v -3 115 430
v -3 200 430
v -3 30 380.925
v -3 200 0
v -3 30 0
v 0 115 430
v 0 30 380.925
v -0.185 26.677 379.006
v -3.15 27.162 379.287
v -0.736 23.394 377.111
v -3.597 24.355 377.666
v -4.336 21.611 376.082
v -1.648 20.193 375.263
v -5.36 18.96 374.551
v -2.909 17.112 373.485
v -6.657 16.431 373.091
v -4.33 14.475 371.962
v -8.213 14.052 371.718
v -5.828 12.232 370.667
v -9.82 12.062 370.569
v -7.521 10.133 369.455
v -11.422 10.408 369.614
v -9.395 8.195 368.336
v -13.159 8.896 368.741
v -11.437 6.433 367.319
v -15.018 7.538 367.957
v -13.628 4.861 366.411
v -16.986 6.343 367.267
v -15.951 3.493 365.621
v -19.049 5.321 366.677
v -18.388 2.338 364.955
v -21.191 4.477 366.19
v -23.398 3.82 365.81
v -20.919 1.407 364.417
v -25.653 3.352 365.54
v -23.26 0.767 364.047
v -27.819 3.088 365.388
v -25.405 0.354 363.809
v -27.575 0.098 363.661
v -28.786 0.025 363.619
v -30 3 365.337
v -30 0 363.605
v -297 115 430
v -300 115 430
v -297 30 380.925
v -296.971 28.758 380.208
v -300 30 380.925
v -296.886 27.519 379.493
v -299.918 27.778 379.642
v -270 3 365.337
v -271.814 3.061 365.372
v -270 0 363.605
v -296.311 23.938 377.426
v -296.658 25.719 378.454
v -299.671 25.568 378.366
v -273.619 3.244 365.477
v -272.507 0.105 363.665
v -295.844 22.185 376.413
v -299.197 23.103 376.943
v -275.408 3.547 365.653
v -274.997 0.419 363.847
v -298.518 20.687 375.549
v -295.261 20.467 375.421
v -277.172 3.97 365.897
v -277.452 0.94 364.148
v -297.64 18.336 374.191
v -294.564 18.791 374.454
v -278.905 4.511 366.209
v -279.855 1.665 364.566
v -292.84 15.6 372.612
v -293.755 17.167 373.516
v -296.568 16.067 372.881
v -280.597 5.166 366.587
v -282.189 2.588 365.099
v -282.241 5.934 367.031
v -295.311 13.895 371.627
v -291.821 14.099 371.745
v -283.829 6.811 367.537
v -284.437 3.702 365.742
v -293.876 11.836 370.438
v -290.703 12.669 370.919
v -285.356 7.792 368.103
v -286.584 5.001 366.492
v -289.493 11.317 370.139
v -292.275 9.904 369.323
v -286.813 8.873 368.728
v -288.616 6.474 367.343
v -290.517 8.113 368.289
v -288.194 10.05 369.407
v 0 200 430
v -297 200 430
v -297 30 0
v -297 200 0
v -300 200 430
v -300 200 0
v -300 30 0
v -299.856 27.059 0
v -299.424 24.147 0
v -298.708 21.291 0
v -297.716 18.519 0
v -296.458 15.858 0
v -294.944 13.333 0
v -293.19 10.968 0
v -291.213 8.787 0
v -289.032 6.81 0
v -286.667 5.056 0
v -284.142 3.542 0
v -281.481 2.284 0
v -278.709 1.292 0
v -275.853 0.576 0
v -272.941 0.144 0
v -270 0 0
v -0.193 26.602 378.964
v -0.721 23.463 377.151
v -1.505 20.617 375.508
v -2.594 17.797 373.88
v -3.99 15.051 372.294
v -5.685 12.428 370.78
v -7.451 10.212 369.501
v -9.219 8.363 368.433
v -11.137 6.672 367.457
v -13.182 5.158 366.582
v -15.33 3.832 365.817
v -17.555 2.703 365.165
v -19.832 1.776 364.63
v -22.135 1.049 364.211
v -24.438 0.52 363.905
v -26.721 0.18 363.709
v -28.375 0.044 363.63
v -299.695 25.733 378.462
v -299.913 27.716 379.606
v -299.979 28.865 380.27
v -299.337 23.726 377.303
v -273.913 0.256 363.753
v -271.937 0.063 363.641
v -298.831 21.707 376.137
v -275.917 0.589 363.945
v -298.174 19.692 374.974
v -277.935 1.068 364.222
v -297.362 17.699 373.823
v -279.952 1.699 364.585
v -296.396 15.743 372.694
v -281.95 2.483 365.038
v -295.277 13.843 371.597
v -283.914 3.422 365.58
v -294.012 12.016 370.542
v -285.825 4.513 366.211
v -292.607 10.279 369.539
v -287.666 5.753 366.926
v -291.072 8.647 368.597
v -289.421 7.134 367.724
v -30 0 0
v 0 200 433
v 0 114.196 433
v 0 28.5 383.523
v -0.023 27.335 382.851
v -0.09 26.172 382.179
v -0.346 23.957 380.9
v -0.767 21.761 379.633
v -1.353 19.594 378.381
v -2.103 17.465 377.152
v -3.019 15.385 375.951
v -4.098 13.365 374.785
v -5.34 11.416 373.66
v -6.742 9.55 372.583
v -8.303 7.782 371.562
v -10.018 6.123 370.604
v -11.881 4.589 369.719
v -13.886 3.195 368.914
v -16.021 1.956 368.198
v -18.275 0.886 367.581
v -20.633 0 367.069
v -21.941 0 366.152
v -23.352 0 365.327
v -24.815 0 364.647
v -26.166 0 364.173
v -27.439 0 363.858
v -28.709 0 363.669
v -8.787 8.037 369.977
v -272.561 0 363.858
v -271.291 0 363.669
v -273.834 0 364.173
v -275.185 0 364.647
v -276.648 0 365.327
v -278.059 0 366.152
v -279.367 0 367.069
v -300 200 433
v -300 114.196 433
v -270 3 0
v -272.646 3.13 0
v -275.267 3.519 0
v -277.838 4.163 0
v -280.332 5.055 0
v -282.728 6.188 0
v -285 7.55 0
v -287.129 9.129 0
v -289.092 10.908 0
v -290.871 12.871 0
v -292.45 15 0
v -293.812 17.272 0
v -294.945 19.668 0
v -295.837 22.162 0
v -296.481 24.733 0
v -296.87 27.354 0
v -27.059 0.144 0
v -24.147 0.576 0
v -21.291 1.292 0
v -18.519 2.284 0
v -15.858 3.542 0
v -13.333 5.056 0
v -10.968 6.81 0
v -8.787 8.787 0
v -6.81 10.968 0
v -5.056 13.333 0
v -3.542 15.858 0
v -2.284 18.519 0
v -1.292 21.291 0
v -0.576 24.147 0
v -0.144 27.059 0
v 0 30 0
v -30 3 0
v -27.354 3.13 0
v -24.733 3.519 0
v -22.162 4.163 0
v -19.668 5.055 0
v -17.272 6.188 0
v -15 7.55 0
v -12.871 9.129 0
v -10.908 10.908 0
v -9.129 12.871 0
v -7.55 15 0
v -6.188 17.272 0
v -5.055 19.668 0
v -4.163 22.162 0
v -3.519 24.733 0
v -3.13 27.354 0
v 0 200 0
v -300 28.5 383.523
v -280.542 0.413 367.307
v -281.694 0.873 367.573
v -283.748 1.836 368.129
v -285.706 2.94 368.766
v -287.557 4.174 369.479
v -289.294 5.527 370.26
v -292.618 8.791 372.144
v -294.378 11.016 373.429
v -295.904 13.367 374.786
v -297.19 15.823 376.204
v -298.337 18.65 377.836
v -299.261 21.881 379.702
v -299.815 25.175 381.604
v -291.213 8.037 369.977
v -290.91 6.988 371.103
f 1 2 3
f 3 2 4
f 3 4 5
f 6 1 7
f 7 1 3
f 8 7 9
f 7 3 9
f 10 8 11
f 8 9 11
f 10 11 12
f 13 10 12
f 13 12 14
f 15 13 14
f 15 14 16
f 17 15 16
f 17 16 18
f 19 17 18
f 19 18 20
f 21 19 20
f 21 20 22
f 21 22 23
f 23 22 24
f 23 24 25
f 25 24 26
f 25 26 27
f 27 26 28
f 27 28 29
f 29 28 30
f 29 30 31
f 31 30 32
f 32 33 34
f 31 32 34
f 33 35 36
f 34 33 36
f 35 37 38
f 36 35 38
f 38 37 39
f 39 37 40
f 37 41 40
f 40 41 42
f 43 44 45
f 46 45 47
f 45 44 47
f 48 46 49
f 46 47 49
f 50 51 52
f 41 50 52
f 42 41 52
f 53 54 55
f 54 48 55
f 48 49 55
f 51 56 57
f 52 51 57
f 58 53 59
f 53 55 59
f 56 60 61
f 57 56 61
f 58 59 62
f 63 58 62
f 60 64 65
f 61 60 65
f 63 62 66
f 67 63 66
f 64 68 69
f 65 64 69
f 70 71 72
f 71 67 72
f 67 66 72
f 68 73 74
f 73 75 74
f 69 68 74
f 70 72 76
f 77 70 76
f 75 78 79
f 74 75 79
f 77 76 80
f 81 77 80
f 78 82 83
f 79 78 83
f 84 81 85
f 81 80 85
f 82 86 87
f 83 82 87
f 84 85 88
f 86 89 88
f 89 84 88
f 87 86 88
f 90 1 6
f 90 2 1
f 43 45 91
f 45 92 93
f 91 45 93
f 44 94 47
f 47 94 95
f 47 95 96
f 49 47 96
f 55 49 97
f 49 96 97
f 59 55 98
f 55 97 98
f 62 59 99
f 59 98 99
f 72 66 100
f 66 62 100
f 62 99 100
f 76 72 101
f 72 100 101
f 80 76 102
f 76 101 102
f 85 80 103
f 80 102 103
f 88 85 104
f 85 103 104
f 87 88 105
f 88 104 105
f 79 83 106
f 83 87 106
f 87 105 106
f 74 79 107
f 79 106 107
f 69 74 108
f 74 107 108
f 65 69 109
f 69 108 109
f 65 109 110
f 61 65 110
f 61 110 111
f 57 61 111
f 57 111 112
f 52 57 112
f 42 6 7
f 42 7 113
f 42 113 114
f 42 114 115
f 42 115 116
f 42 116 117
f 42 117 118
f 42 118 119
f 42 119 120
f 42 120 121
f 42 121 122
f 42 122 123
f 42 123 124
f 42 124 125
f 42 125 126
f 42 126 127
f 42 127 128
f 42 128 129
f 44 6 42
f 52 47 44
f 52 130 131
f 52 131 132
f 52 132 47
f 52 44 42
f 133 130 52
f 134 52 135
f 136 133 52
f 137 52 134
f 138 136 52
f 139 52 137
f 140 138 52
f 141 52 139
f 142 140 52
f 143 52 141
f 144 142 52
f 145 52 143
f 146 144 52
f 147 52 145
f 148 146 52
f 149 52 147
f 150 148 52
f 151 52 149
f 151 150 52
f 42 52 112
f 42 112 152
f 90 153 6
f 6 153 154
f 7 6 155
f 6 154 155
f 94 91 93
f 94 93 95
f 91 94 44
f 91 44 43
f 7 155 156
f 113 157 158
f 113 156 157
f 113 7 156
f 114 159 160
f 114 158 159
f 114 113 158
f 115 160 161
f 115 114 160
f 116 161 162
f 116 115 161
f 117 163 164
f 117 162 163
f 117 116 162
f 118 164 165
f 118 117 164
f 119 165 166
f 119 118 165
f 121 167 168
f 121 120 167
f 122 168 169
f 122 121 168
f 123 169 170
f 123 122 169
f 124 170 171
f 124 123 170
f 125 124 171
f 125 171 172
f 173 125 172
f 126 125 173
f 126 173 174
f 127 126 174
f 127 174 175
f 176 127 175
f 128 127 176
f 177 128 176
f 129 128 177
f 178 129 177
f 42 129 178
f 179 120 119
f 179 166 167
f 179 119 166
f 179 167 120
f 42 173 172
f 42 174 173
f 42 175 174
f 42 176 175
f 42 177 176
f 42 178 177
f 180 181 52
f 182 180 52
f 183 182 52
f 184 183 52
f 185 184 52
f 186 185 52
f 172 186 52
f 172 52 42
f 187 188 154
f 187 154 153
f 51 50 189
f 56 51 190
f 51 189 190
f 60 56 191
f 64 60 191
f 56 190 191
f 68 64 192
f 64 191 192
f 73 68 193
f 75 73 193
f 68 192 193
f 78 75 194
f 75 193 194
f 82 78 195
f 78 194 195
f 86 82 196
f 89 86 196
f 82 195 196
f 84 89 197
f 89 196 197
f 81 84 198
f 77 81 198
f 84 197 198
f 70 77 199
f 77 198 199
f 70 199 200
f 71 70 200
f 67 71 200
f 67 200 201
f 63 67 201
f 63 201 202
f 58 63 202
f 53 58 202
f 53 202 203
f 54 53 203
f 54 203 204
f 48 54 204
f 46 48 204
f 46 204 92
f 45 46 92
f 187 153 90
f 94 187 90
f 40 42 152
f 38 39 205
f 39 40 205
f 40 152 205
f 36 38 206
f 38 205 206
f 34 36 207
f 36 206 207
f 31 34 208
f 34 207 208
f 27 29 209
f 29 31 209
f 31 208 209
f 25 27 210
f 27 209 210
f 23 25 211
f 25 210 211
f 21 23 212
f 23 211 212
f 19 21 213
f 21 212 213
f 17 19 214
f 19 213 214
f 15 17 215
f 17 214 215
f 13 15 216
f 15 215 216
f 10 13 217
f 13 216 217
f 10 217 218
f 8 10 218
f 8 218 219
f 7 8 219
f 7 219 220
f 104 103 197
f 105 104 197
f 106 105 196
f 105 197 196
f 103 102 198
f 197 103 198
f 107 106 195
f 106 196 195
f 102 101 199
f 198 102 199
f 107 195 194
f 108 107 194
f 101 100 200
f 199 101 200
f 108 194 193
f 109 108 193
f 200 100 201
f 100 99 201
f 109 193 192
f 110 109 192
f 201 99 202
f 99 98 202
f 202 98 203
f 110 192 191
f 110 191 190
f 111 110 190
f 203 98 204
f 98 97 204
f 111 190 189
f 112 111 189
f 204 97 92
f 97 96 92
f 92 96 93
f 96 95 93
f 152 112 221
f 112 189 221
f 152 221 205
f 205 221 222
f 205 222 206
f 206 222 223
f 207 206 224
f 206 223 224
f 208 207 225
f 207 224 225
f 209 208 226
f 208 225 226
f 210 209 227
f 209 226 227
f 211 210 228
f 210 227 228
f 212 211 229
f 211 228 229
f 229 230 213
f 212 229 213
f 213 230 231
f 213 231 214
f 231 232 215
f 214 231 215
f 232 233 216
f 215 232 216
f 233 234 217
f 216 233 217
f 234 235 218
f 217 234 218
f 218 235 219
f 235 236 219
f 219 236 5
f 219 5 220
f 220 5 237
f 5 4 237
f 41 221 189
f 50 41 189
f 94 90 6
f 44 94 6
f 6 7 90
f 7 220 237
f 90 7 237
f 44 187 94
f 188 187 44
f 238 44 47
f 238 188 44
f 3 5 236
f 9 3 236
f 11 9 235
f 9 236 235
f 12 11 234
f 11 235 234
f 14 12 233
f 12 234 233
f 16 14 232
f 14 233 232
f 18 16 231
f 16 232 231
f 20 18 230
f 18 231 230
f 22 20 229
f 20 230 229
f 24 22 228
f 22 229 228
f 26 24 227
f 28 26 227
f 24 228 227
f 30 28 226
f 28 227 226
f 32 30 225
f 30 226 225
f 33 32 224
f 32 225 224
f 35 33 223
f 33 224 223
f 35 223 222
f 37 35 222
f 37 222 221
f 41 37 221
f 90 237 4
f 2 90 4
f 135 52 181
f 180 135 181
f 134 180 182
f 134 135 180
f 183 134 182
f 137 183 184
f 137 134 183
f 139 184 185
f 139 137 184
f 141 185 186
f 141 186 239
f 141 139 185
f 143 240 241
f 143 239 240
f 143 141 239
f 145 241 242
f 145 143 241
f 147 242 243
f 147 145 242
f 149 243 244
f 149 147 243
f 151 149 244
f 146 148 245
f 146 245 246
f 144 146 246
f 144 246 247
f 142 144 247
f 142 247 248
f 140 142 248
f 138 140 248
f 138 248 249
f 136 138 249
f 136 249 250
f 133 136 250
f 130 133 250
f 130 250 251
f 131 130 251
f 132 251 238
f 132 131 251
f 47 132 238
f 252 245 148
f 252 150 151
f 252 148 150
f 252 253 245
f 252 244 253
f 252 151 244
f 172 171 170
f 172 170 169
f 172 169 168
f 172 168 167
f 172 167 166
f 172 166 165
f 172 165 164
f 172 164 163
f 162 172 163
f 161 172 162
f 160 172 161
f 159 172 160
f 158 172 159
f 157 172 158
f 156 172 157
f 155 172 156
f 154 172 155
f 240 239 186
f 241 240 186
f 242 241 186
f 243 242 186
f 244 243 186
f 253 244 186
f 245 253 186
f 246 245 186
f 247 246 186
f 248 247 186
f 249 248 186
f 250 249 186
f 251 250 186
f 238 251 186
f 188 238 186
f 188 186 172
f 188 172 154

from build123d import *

# Parameters (mm, degrees)
F1_DEPTH = 430
F3_DEPTH = 455
F5_DEPTH = 300
F7_DEPTH = 16


with BuildPart() as f1:
    # F0 (on Top) → F1 (new body)
    with BuildSketch(Plane.XY):
        with BuildLine():
            Line((-270, 0), (-30, 0))
            ThreePointArc((-30, 0), (-8.7867965644, 8.7867965644), (0, 30))
            Line((0, 30), (0, 200))
            Line((0, 200), (-3, 200))
            Line((-3, 200), (-3, 30))
            ThreePointArc((-3, 30), (-10.908116908, 10.908116908), (-30, 3))
            Line((-30, 3), (-270, 3))
            ThreePointArc((-270, 3), (-289.091883092, 10.908116908), (-297, 30))
            Line((-297, 30), (-297, 200))
            Line((-297, 200), (-300, 200))
            Line((-300, 200), (-300, 30))
            ThreePointArc((-300, 30), (-291.2132034356, 8.7867965644), (-270, 0))
        make_face()
    extrude(amount=F1_DEPTH)

    # F2 (on face) → F3 (cut)
    with BuildSketch(Plane(origin=(-300, 0, 0), x_dir=(0, -1, 0), z_dir=(-1, 0, 0))):
        Polygon((118.6937963123, 430), (-30, 430), (-30, 380.9252271189), (118.6937963123, 295.0768237912), align=None)
        Polygon((-30, 430), (-115, 430), (-30, 380.9252271189), align=None)
    extrude(amount=-F3_DEPTH, mode=Mode.SUBTRACT)


with BuildPart() as f5:
    # F4 (on face) → F5 (new body)
    with BuildSketch(Plane(origin=(-300, 0, 0), x_dir=(0, -1, 0), z_dir=(-1, 0, 0))):
        Polygon((-200, 430), (-115, 430), (-30, 380.9252271189), (0, 363.6047190432), (0, 367.0688206583), (-28.5, 383.5233033302), (-114.1961524227, 433), (-200, 433), align=None)
    extrude(amount=-F5_DEPTH)

    # F6 (on face) → F7 (cut)
    with BuildSketch(Plane(origin=(0, -157.4454618137, 272.7035392824), x_dir=(1, 0, 0), z_dir=(0, 0.5, -0.8660254038))):
        with BuildLine():
            Line((0, -181.8023595216), (-30, -181.8023595216))
            add(Edge.make_bspline(
                [(0, -216.443375673), (0, -181.8023595216), (-30, -181.8023595216)],
                knots=[4.7123889804, 4.7123889804, 4.7123889804, 6.2831853072, 6.2831853072, 6.2831853072], degree=2, weights=[1, 0.7071067812, 1]))
            Line((0, -216.443375673), (0, -181.8023595216))
        make_face()
        with BuildLine():
            add(Edge.make_bspline(
                [(-270, -181.8023595216), (-300, -181.8023595216), (-300, -216.443375673)],
                knots=[0, 0, 0, 1.5707963268, 1.5707963268, 1.5707963268], degree=2, weights=[1, 0.7071067812, 1]))
            Line((-270, -181.8023595216), (-300, -181.8023595216))
            Line((-300, -181.8023595216), (-300, -216.443375673))
        make_face()
    extrude(amount=-F7_DEPTH, mode=Mode.SUBTRACT)


solid = Compound([f1.part, f5.part])
